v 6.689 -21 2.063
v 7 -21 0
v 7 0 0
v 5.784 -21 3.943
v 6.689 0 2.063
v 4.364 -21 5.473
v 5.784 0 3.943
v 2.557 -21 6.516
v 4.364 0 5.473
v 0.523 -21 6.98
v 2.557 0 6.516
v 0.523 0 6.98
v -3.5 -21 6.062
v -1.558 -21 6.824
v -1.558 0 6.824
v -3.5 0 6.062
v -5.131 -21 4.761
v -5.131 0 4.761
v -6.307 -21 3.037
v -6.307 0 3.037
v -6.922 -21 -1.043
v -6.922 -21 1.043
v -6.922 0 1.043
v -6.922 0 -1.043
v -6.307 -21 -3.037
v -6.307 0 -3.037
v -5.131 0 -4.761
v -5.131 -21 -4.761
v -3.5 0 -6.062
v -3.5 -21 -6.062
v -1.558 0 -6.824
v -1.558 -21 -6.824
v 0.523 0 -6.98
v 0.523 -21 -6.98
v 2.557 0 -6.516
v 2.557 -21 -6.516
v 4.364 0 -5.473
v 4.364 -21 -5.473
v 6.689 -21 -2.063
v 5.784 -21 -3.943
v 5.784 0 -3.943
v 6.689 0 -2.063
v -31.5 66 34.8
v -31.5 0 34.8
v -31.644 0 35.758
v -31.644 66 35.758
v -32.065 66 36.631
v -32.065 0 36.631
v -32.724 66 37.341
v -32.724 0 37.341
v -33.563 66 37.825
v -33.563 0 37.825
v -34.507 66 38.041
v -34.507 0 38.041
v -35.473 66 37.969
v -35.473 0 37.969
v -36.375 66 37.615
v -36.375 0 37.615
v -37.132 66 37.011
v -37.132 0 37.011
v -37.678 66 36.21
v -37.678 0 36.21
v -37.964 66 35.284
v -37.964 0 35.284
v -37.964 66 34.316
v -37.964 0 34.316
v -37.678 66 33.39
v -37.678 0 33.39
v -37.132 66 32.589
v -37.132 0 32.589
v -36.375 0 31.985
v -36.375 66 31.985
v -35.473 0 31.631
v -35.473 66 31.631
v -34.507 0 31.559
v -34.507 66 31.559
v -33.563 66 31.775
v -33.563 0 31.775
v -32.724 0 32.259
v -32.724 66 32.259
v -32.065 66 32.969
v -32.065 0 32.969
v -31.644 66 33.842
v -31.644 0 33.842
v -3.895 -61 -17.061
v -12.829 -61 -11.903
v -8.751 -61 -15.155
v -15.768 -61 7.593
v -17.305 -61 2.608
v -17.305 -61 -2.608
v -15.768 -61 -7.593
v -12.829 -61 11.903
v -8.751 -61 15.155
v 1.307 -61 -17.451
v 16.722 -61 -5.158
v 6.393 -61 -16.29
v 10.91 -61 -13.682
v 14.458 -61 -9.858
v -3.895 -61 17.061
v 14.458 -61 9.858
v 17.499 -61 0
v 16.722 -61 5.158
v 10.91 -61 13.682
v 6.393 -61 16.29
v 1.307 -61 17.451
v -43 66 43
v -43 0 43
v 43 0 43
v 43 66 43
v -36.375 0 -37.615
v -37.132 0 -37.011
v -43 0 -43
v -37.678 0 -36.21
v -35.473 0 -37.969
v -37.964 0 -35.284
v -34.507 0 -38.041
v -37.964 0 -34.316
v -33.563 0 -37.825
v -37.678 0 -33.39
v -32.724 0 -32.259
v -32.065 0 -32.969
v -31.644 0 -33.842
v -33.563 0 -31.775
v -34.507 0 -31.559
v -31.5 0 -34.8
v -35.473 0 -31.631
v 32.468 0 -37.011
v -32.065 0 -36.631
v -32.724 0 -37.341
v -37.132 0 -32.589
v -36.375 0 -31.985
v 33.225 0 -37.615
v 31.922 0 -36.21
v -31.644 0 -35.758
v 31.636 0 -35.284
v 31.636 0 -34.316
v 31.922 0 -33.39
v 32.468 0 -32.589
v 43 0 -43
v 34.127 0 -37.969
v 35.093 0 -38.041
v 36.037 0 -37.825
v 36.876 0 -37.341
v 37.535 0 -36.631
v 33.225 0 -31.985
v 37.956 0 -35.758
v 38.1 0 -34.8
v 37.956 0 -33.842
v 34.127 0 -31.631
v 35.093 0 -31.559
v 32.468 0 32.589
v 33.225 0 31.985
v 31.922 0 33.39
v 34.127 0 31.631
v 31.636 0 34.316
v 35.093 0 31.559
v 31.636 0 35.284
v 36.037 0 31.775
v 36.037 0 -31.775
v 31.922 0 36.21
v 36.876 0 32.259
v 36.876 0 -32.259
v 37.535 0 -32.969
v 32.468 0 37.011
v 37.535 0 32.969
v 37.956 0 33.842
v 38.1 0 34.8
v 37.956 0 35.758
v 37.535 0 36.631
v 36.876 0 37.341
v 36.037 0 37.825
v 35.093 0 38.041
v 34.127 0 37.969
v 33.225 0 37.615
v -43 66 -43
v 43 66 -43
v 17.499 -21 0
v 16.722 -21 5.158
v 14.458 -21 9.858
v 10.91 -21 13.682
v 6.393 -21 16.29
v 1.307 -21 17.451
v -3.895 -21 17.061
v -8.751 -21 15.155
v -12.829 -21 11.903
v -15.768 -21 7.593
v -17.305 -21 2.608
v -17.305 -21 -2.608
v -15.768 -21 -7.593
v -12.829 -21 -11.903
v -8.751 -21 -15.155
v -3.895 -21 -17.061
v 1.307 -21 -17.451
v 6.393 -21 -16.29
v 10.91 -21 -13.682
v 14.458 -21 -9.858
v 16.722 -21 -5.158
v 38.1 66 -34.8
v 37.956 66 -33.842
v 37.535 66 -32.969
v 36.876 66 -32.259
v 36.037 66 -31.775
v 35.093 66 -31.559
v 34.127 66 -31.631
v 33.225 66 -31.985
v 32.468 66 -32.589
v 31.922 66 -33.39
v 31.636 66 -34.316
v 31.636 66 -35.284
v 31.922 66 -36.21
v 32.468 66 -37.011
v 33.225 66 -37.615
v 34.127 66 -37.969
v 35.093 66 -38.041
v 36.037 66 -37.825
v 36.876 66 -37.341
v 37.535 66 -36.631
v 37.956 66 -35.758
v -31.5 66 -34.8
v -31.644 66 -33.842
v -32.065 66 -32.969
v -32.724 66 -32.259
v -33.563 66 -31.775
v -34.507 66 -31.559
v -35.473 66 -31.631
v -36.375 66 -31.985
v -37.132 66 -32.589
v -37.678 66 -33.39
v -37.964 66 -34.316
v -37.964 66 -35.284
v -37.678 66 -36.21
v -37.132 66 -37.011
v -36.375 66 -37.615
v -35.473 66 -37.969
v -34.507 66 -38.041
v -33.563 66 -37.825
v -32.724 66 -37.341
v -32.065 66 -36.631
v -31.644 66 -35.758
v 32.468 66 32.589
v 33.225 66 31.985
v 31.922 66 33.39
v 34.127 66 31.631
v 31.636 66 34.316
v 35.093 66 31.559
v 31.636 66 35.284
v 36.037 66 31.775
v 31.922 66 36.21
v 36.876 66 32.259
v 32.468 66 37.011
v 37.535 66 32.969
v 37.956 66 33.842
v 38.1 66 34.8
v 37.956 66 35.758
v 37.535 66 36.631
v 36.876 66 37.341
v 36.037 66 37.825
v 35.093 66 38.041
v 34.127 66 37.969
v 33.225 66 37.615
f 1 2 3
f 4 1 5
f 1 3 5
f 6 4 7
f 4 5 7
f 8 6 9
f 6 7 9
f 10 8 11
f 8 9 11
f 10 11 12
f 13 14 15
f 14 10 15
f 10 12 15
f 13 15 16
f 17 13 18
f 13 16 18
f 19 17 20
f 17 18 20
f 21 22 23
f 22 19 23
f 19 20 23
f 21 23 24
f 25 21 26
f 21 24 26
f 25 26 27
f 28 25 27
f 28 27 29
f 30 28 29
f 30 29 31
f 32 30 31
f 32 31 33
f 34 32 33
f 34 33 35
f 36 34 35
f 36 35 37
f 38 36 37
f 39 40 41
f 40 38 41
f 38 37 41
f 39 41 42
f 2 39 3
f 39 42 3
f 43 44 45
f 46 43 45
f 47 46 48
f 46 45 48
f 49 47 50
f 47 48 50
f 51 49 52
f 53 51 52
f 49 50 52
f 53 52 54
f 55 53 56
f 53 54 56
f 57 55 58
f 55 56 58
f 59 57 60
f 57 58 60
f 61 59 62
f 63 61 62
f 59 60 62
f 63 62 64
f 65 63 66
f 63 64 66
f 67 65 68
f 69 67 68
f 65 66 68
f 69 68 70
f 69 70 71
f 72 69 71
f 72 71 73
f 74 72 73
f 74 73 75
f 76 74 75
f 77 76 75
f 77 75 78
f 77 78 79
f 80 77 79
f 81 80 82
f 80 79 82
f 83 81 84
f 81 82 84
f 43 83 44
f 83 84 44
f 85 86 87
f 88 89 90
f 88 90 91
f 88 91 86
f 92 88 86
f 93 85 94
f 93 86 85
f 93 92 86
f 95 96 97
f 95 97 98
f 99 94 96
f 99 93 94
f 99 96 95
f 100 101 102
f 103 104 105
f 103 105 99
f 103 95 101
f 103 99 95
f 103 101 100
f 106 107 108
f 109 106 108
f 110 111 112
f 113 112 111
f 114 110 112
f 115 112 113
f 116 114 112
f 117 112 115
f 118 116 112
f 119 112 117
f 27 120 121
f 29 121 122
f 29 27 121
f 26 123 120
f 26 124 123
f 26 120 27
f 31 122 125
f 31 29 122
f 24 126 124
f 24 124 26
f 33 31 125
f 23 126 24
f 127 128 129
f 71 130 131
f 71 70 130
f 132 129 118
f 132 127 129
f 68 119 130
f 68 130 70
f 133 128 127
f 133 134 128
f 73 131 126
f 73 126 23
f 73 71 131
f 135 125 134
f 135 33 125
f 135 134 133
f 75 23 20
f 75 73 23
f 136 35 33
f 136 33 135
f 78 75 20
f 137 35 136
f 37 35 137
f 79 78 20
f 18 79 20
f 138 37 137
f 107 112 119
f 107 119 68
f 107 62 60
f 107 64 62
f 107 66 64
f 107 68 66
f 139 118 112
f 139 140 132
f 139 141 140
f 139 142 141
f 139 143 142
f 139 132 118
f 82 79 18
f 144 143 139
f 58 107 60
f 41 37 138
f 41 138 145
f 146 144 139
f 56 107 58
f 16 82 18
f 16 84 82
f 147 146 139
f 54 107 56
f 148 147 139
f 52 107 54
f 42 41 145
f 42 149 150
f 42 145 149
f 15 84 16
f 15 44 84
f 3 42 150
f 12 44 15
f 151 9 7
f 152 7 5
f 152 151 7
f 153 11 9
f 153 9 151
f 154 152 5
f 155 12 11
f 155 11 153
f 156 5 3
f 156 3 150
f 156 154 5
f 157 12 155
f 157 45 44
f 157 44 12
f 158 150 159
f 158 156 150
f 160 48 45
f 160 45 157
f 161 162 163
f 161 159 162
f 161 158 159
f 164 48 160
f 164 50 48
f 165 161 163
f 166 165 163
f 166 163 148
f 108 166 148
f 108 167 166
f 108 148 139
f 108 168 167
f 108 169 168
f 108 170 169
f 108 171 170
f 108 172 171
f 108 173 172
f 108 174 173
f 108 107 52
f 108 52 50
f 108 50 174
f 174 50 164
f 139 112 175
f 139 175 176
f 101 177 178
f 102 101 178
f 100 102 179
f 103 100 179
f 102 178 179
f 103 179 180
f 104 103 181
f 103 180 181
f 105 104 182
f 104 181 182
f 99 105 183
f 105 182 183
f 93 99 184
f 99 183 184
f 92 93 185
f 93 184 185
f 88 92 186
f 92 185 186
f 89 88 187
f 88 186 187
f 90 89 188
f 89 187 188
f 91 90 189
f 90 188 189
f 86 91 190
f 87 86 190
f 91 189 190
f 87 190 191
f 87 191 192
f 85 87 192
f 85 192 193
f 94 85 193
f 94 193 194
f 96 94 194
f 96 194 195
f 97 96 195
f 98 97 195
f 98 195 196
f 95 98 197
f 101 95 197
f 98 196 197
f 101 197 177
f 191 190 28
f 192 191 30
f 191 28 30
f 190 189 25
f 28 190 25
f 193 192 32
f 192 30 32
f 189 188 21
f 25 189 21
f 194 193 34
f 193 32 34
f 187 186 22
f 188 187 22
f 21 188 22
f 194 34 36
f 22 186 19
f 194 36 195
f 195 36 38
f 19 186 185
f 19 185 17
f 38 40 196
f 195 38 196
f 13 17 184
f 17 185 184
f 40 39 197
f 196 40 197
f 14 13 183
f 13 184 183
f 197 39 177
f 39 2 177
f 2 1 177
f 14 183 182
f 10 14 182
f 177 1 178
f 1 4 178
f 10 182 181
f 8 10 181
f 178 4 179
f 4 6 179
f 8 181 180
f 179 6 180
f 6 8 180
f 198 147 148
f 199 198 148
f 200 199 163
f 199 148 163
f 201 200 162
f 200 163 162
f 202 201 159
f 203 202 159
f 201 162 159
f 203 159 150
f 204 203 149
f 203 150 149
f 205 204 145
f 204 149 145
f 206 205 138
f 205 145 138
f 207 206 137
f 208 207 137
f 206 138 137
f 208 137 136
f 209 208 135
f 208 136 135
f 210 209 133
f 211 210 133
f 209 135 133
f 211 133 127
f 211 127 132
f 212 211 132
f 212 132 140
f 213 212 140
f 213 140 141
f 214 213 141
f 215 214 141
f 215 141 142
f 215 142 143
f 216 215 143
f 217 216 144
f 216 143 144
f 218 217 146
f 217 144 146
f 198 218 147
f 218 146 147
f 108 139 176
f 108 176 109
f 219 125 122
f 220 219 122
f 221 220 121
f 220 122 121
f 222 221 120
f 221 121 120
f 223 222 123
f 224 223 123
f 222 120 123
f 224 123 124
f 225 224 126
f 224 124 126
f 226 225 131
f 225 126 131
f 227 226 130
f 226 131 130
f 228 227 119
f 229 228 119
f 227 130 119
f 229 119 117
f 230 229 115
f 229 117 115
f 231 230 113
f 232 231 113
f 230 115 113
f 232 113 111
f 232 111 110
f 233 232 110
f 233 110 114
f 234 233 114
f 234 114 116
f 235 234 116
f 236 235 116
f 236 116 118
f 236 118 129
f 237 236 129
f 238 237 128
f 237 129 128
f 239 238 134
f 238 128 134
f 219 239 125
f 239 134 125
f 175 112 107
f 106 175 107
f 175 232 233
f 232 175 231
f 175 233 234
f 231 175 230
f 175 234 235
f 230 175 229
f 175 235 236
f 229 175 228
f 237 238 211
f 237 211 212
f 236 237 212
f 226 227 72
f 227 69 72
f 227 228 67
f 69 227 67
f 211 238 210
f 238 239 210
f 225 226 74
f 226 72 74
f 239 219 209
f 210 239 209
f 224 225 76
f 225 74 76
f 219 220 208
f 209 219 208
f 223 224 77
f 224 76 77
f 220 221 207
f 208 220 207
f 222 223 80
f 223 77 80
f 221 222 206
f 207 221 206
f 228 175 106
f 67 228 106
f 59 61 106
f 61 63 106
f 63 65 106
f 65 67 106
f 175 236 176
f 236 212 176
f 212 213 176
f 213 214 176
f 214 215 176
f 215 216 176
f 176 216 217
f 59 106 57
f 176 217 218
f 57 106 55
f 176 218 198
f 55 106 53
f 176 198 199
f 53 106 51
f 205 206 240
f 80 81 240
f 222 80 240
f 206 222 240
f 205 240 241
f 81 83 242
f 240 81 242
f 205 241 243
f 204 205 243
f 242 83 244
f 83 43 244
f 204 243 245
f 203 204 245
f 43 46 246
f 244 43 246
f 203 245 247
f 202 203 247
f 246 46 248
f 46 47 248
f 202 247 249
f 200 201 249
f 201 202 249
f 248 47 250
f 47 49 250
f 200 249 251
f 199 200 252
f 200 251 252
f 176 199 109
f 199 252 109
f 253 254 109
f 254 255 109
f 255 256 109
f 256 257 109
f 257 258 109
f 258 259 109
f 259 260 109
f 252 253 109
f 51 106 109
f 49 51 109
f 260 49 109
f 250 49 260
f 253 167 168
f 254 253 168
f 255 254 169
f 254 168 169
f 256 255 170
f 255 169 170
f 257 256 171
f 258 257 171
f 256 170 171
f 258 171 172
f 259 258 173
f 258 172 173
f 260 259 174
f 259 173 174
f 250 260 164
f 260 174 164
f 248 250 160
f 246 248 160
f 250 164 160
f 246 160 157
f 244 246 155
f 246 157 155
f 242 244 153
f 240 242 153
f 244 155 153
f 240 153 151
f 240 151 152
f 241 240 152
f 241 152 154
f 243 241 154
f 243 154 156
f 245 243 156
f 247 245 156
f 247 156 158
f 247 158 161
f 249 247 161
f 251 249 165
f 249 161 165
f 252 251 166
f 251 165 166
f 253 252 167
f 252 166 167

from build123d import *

# Parameters (mm, degrees)
F0_W     = 86
F0_H     = 86
F0_R     = 3.25
F1_DEPTH = 66
F2_R     = 7
F3_DEPTH = 36
F5_R     = 17.5
F6_DEPTH = 40


with BuildPart() as f1:
    # F0 (on Front) → F1 (new body)
    with BuildSketch(Plane.XZ):
        Rectangle(F0_W, F0_H)
        with Locations((-34.75, -34.8)):
            Circle(F0_R, mode=Mode.SUBTRACT)
        with Locations((34.85, -34.8)):
            Circle(F0_R, mode=Mode.SUBTRACT)
        with Locations((-34.75, 34.8)):
            Circle(F0_R, mode=Mode.SUBTRACT)
        with Locations((34.85, 34.8)):
            Circle(F0_R, mode=Mode.SUBTRACT)
    extrude(amount=-F1_DEPTH)

    # F2 (on face) → F3 (join)
    with BuildSketch(Plane.XZ):
        Circle(F2_R)
    extrude(amount=F3_DEPTH)

    # F5 (on offset) → F6 (join)
    with BuildSketch(Plane(origin=(-0.000934, -21, 0), x_dir=(1, 0, 0), z_dir=(0, -1, 0))):
        Circle(F5_R)
    extrude(amount=F6_DEPTH)


solid = f1.part
